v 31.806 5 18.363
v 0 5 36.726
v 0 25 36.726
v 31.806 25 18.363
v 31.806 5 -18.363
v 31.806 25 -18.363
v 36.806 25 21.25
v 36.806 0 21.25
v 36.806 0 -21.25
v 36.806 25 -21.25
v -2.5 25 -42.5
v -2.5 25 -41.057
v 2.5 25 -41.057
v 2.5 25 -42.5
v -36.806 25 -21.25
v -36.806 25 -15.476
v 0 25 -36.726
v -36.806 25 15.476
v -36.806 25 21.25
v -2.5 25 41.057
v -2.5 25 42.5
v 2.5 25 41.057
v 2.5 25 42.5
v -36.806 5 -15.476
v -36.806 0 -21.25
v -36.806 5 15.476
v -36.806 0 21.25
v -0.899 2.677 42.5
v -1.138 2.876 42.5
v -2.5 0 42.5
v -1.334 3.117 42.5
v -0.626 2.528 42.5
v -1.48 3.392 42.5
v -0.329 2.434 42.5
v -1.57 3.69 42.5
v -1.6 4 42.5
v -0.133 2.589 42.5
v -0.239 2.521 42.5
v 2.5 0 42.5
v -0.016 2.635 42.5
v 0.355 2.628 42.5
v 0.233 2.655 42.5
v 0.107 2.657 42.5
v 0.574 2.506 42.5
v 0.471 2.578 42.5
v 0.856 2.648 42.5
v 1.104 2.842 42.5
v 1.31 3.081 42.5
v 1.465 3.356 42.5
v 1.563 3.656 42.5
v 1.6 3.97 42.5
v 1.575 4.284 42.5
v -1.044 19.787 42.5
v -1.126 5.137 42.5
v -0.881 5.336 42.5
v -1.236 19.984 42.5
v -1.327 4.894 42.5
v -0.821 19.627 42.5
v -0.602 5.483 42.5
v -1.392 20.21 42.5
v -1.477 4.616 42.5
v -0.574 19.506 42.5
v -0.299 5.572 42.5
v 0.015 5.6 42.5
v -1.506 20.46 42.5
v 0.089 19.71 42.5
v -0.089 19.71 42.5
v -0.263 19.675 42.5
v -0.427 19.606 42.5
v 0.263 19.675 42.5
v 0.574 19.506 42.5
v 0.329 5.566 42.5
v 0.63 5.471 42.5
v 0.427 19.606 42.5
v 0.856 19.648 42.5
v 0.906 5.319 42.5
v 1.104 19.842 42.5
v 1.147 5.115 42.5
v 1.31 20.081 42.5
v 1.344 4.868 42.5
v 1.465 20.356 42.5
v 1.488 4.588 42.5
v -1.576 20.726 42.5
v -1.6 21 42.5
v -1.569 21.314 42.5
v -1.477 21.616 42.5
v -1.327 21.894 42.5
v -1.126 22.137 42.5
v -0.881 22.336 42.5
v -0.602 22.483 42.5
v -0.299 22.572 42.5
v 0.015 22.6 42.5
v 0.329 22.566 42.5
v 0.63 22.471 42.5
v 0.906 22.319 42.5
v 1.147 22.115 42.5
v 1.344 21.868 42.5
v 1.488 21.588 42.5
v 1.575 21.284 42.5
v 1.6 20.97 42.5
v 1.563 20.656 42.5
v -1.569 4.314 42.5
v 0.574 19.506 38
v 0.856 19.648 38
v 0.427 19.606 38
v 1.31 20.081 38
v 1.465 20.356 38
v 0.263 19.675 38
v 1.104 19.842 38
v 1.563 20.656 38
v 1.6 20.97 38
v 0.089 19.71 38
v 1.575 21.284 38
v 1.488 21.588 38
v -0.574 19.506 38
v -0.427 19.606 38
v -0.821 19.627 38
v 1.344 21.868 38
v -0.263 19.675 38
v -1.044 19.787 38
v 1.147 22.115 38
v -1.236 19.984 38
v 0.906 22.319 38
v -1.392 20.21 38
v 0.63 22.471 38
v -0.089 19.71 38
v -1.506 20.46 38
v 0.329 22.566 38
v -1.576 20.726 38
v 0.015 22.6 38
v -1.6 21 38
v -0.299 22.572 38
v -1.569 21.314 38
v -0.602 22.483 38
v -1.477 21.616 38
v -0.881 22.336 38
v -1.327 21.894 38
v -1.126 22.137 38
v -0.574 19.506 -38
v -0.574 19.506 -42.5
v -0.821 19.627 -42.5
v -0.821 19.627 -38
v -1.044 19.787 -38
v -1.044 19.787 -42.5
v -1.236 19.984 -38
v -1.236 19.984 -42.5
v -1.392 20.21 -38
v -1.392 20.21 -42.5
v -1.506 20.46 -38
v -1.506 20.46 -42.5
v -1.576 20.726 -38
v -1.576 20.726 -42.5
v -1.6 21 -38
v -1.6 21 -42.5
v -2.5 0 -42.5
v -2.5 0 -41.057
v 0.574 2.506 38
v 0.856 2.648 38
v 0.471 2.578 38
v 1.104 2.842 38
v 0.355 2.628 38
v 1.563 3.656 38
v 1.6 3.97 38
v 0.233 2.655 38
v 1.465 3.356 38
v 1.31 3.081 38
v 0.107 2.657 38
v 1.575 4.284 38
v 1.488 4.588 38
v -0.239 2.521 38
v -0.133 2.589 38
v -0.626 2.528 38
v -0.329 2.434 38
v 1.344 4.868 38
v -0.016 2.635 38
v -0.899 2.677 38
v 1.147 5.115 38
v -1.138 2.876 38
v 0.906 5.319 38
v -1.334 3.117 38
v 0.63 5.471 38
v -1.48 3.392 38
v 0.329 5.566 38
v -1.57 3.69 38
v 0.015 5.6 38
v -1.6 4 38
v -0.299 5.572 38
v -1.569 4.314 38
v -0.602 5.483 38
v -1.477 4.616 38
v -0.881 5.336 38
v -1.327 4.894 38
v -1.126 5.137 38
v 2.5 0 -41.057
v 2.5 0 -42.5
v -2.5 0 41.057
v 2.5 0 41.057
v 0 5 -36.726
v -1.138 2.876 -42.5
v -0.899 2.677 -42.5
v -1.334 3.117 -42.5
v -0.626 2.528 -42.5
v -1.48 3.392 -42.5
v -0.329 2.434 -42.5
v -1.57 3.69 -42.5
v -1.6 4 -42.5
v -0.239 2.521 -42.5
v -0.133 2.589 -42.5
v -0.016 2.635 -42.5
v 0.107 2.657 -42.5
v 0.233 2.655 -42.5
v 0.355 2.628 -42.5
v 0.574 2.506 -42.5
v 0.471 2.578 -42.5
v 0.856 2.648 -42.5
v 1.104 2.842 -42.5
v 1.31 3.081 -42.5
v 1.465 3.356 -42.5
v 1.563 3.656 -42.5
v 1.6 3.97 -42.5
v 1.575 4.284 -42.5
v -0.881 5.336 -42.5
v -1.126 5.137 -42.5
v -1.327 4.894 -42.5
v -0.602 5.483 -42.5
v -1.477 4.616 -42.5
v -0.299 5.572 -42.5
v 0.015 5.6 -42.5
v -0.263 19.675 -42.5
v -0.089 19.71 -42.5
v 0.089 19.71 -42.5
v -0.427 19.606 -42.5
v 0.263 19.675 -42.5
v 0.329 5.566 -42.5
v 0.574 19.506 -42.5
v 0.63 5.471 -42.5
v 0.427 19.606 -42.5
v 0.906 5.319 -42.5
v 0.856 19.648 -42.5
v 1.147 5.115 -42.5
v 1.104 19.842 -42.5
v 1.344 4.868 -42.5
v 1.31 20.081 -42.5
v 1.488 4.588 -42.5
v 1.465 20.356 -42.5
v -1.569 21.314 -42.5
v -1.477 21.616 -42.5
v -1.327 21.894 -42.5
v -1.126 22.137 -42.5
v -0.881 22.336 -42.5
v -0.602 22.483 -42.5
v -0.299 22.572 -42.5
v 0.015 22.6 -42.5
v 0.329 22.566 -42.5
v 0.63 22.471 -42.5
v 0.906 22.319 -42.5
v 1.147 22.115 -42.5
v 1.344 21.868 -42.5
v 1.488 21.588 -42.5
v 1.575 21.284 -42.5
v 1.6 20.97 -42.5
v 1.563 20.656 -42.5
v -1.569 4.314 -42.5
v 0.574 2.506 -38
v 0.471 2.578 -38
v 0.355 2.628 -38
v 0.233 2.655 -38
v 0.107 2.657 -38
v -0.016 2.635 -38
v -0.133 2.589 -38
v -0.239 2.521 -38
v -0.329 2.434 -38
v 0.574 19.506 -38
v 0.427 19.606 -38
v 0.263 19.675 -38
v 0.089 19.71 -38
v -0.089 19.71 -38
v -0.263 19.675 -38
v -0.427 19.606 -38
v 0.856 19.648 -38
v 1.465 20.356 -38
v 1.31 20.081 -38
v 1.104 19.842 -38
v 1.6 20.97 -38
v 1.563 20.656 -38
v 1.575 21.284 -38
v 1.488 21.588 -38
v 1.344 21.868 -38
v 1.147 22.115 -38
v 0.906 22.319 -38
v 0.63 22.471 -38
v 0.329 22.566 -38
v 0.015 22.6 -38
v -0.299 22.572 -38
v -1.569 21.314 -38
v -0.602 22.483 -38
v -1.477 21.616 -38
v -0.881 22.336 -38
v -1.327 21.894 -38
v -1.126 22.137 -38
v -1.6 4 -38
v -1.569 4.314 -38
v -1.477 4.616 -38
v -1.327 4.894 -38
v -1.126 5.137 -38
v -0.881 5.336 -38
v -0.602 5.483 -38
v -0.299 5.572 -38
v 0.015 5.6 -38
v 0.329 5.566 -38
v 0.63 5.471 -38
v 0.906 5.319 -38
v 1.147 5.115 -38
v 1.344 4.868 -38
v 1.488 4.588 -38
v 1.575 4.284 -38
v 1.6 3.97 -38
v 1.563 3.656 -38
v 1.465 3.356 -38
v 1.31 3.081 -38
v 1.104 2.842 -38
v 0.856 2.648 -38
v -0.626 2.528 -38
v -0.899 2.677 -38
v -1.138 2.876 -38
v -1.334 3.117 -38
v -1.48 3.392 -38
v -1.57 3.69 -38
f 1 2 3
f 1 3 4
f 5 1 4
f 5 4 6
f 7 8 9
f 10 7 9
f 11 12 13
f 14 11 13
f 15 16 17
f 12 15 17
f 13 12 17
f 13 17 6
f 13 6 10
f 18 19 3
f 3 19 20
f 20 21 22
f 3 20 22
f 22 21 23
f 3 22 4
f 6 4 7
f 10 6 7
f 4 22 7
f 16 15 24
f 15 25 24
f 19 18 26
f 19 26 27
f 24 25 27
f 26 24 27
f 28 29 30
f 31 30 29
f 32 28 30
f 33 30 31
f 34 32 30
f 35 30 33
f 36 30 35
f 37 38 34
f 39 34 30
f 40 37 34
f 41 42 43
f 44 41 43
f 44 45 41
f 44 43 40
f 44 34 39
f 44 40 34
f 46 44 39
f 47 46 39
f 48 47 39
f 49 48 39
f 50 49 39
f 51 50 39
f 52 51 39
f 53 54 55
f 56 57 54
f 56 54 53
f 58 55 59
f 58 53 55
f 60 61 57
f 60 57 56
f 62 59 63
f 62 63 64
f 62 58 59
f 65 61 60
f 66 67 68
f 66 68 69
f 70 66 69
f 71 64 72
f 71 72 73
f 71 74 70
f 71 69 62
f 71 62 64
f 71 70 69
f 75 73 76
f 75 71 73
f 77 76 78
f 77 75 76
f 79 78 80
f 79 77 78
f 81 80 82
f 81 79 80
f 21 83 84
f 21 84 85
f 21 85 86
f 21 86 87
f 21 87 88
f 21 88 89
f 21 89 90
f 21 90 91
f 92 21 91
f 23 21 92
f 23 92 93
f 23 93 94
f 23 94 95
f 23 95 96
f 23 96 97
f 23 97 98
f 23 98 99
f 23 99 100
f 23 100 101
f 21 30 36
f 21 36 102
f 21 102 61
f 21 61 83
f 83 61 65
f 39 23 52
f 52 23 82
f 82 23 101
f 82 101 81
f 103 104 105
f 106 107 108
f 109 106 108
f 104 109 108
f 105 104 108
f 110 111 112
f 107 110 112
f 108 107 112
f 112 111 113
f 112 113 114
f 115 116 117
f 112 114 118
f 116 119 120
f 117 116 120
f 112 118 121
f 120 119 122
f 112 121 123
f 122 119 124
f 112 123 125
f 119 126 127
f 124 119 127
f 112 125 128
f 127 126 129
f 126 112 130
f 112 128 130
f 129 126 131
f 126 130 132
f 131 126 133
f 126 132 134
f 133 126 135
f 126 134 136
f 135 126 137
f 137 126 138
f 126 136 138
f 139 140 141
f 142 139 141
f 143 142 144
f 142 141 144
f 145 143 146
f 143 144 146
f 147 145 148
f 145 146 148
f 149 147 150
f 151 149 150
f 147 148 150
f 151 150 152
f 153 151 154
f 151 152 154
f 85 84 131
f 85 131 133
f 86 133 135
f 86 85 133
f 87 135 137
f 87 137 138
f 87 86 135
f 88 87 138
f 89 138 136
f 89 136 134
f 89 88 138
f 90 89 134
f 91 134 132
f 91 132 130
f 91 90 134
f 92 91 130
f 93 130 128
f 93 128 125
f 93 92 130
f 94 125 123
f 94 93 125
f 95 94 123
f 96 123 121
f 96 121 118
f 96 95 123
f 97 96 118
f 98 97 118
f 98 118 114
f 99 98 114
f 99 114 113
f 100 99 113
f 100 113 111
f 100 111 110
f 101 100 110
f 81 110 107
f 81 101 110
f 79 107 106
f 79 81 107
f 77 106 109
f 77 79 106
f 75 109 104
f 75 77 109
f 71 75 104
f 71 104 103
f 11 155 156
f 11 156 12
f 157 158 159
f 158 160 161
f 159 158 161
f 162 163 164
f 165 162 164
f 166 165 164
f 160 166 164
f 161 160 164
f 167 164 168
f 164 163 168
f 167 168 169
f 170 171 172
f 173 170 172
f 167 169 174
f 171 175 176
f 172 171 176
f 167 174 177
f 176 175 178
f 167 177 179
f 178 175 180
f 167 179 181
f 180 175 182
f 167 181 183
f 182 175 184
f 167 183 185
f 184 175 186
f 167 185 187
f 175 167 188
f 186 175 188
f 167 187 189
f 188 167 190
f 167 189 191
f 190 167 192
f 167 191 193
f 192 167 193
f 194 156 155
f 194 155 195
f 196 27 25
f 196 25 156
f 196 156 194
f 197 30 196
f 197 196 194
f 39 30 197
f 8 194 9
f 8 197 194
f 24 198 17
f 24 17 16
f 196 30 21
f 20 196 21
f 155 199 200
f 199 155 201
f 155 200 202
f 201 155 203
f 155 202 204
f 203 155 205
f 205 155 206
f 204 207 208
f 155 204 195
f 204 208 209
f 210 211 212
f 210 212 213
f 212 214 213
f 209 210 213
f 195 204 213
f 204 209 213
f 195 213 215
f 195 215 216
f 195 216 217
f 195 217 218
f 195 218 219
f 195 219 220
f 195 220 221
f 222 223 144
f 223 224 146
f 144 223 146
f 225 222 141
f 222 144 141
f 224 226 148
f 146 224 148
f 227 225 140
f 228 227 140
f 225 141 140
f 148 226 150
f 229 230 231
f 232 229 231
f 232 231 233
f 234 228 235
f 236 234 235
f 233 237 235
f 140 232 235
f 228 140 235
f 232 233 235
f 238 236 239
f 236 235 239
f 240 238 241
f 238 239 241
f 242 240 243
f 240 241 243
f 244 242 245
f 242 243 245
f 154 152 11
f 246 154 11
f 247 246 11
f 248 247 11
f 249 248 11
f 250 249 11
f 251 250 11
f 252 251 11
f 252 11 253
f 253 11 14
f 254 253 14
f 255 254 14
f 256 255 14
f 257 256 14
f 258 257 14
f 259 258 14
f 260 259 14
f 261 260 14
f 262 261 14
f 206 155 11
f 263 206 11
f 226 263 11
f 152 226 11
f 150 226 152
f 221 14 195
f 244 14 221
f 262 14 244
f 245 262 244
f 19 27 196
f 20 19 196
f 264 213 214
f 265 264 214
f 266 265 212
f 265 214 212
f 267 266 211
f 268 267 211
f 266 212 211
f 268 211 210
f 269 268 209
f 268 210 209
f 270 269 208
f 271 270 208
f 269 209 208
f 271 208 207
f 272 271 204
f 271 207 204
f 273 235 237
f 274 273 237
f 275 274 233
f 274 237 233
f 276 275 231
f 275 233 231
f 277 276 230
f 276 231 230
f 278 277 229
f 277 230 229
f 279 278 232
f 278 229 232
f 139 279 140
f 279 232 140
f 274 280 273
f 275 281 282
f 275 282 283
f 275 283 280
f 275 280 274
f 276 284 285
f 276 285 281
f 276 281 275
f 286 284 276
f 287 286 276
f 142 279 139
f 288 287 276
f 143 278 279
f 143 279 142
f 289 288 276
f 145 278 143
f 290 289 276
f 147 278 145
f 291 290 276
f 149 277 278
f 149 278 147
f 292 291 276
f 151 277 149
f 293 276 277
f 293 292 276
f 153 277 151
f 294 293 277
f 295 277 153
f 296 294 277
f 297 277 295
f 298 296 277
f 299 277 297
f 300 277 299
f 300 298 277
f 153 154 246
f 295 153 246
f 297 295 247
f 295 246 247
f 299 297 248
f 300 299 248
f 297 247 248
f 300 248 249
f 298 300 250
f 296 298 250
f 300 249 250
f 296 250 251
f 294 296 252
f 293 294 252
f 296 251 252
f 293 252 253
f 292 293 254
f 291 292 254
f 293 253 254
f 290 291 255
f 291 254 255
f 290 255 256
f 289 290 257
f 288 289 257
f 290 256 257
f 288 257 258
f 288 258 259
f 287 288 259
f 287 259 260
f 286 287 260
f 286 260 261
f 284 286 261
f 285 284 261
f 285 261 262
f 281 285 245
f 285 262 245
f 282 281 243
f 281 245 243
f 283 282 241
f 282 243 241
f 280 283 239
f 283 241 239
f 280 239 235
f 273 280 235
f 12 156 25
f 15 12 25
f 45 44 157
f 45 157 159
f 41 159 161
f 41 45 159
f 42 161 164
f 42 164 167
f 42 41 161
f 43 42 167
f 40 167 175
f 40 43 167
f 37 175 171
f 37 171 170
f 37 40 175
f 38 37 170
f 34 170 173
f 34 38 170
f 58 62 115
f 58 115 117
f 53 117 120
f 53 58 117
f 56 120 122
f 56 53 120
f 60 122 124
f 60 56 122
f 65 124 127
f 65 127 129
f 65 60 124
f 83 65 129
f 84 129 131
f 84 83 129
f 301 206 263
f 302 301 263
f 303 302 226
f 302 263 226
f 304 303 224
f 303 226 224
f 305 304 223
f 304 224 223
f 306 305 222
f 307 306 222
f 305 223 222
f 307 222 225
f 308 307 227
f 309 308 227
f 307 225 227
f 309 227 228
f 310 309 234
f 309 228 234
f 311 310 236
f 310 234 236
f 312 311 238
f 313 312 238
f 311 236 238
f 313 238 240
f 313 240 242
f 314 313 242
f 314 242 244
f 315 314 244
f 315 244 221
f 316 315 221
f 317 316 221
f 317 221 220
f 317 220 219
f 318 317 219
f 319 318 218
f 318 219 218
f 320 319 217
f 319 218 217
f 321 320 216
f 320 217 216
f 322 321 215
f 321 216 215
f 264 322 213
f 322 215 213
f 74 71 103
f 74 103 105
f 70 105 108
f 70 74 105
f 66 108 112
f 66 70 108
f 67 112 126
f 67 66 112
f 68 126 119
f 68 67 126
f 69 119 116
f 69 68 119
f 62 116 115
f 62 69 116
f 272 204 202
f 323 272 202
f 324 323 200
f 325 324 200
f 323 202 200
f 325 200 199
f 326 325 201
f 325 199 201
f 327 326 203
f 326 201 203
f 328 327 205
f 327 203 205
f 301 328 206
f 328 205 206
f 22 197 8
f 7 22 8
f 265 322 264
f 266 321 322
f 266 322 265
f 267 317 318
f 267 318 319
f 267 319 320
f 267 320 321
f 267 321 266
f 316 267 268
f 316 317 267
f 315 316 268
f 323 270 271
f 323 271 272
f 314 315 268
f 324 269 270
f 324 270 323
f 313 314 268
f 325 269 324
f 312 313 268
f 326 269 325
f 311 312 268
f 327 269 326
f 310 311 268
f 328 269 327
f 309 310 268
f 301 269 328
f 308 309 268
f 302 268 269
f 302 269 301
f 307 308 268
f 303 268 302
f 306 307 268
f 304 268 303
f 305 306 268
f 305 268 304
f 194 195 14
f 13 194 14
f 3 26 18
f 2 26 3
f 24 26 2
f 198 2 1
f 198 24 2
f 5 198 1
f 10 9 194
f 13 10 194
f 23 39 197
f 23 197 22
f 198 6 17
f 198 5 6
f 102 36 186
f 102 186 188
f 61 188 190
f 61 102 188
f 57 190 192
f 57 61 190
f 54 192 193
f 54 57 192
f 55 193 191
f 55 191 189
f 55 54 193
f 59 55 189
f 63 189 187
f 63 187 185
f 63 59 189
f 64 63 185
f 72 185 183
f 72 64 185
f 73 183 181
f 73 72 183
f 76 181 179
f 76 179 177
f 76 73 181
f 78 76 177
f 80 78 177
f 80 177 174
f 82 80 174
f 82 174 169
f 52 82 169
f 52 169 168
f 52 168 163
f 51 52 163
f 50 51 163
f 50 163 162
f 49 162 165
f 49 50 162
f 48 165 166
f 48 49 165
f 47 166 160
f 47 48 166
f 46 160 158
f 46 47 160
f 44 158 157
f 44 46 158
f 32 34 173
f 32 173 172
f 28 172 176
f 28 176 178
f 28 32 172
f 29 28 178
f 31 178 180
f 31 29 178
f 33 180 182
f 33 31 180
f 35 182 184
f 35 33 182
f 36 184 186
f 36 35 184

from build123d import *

# Parameters (mm, degrees)
BOSS_EXTRUDE1_DEPTH = 25
SHELL1_T            = -5
SKETCH3_W           = 5
SKETCH3_H           = 25
BOSS_EXTRUDE3_DEPTH = 5
CUT_EXTRUDE1_DEPTH  = 4.5


with BuildPart() as part:
    # Sketch1 → Boss-Extrude1 (new body)
    with BuildSketch(Plane(origin=(0, 0, 0), x_dir=(1, 0, 0), z_dir=(0, 1, 0))):
        Polygon((0, 42.5), (-36.806079661, 21.25), (-36.806079661, -21.25), (0, -42.5), (36.806079661, -21.25), (36.806079661, 21.25), align=None)
    extrude(amount=BOSS_EXTRUDE1_DEPTH)

    # Shell1
    shell1_openings = [part.faces().sort_by_distance(p)[0] for p in [
        (0, 25, 0),
        (-36.806079661, 12.5, 0),
    ]]
    offset(amount=SHELL1_T, openings=shell1_openings, kind=Kind.INTERSECTION)

    # Sketch3 → Boss-Extrude3 (add)
    with BuildSketch(Plane.XY.offset(-42.5)):
        with Locations((0, 12.5)):
            Rectangle(SKETCH3_W, SKETCH3_H)
    boss_extrude3 = extrude(amount=BOSS_EXTRUDE3_DEPTH)

    # Sketch4 → Cut-Extrude1 (cut)
    with BuildSketch(Plane(origin=(0, 0, -42.5), x_dir=(-1, 0, 0), z_dir=(0, 0, -1))):
        with BuildLine():
            ThreePointArc((0.573600046, 19.506352456), (1.318666007, 20.093843301), (1.6, 21))
            ThreePointArc((1.6, 21), (-0.906156699, 22.318666007), (-0.573600046, 19.506352456))
            ThreePointArc((-0.573600046, 19.506352456), (0, 19.71460041), (0.573600046, 19.506352456))
        make_face()
        with BuildLine():
            ThreePointArc((0.329089607, 2.434209455), (1.242284865, 2.991670533), (1.6, 4))
            ThreePointArc((1.6, 4), (-0.906156699, 5.318666007), (-0.573600046, 2.506352456))
            ThreePointArc((-0.573600046, 2.506352456), (-0.107313915, 2.657234104), (0.329089607, 2.434209455))
        make_face()
    cut_extrude1 = extrude(amount=-CUT_EXTRUDE1_DEPTH, mode=Mode.SUBTRACT)

    # Mirror1: Boss-Extrude3, Cut-Extrude1 across plane
    add(boss_extrude3.mirror(Plane.XY))
    add(cut_extrude1.mirror(Plane.XY), mode=Mode.SUBTRACT)


solid = part.part
